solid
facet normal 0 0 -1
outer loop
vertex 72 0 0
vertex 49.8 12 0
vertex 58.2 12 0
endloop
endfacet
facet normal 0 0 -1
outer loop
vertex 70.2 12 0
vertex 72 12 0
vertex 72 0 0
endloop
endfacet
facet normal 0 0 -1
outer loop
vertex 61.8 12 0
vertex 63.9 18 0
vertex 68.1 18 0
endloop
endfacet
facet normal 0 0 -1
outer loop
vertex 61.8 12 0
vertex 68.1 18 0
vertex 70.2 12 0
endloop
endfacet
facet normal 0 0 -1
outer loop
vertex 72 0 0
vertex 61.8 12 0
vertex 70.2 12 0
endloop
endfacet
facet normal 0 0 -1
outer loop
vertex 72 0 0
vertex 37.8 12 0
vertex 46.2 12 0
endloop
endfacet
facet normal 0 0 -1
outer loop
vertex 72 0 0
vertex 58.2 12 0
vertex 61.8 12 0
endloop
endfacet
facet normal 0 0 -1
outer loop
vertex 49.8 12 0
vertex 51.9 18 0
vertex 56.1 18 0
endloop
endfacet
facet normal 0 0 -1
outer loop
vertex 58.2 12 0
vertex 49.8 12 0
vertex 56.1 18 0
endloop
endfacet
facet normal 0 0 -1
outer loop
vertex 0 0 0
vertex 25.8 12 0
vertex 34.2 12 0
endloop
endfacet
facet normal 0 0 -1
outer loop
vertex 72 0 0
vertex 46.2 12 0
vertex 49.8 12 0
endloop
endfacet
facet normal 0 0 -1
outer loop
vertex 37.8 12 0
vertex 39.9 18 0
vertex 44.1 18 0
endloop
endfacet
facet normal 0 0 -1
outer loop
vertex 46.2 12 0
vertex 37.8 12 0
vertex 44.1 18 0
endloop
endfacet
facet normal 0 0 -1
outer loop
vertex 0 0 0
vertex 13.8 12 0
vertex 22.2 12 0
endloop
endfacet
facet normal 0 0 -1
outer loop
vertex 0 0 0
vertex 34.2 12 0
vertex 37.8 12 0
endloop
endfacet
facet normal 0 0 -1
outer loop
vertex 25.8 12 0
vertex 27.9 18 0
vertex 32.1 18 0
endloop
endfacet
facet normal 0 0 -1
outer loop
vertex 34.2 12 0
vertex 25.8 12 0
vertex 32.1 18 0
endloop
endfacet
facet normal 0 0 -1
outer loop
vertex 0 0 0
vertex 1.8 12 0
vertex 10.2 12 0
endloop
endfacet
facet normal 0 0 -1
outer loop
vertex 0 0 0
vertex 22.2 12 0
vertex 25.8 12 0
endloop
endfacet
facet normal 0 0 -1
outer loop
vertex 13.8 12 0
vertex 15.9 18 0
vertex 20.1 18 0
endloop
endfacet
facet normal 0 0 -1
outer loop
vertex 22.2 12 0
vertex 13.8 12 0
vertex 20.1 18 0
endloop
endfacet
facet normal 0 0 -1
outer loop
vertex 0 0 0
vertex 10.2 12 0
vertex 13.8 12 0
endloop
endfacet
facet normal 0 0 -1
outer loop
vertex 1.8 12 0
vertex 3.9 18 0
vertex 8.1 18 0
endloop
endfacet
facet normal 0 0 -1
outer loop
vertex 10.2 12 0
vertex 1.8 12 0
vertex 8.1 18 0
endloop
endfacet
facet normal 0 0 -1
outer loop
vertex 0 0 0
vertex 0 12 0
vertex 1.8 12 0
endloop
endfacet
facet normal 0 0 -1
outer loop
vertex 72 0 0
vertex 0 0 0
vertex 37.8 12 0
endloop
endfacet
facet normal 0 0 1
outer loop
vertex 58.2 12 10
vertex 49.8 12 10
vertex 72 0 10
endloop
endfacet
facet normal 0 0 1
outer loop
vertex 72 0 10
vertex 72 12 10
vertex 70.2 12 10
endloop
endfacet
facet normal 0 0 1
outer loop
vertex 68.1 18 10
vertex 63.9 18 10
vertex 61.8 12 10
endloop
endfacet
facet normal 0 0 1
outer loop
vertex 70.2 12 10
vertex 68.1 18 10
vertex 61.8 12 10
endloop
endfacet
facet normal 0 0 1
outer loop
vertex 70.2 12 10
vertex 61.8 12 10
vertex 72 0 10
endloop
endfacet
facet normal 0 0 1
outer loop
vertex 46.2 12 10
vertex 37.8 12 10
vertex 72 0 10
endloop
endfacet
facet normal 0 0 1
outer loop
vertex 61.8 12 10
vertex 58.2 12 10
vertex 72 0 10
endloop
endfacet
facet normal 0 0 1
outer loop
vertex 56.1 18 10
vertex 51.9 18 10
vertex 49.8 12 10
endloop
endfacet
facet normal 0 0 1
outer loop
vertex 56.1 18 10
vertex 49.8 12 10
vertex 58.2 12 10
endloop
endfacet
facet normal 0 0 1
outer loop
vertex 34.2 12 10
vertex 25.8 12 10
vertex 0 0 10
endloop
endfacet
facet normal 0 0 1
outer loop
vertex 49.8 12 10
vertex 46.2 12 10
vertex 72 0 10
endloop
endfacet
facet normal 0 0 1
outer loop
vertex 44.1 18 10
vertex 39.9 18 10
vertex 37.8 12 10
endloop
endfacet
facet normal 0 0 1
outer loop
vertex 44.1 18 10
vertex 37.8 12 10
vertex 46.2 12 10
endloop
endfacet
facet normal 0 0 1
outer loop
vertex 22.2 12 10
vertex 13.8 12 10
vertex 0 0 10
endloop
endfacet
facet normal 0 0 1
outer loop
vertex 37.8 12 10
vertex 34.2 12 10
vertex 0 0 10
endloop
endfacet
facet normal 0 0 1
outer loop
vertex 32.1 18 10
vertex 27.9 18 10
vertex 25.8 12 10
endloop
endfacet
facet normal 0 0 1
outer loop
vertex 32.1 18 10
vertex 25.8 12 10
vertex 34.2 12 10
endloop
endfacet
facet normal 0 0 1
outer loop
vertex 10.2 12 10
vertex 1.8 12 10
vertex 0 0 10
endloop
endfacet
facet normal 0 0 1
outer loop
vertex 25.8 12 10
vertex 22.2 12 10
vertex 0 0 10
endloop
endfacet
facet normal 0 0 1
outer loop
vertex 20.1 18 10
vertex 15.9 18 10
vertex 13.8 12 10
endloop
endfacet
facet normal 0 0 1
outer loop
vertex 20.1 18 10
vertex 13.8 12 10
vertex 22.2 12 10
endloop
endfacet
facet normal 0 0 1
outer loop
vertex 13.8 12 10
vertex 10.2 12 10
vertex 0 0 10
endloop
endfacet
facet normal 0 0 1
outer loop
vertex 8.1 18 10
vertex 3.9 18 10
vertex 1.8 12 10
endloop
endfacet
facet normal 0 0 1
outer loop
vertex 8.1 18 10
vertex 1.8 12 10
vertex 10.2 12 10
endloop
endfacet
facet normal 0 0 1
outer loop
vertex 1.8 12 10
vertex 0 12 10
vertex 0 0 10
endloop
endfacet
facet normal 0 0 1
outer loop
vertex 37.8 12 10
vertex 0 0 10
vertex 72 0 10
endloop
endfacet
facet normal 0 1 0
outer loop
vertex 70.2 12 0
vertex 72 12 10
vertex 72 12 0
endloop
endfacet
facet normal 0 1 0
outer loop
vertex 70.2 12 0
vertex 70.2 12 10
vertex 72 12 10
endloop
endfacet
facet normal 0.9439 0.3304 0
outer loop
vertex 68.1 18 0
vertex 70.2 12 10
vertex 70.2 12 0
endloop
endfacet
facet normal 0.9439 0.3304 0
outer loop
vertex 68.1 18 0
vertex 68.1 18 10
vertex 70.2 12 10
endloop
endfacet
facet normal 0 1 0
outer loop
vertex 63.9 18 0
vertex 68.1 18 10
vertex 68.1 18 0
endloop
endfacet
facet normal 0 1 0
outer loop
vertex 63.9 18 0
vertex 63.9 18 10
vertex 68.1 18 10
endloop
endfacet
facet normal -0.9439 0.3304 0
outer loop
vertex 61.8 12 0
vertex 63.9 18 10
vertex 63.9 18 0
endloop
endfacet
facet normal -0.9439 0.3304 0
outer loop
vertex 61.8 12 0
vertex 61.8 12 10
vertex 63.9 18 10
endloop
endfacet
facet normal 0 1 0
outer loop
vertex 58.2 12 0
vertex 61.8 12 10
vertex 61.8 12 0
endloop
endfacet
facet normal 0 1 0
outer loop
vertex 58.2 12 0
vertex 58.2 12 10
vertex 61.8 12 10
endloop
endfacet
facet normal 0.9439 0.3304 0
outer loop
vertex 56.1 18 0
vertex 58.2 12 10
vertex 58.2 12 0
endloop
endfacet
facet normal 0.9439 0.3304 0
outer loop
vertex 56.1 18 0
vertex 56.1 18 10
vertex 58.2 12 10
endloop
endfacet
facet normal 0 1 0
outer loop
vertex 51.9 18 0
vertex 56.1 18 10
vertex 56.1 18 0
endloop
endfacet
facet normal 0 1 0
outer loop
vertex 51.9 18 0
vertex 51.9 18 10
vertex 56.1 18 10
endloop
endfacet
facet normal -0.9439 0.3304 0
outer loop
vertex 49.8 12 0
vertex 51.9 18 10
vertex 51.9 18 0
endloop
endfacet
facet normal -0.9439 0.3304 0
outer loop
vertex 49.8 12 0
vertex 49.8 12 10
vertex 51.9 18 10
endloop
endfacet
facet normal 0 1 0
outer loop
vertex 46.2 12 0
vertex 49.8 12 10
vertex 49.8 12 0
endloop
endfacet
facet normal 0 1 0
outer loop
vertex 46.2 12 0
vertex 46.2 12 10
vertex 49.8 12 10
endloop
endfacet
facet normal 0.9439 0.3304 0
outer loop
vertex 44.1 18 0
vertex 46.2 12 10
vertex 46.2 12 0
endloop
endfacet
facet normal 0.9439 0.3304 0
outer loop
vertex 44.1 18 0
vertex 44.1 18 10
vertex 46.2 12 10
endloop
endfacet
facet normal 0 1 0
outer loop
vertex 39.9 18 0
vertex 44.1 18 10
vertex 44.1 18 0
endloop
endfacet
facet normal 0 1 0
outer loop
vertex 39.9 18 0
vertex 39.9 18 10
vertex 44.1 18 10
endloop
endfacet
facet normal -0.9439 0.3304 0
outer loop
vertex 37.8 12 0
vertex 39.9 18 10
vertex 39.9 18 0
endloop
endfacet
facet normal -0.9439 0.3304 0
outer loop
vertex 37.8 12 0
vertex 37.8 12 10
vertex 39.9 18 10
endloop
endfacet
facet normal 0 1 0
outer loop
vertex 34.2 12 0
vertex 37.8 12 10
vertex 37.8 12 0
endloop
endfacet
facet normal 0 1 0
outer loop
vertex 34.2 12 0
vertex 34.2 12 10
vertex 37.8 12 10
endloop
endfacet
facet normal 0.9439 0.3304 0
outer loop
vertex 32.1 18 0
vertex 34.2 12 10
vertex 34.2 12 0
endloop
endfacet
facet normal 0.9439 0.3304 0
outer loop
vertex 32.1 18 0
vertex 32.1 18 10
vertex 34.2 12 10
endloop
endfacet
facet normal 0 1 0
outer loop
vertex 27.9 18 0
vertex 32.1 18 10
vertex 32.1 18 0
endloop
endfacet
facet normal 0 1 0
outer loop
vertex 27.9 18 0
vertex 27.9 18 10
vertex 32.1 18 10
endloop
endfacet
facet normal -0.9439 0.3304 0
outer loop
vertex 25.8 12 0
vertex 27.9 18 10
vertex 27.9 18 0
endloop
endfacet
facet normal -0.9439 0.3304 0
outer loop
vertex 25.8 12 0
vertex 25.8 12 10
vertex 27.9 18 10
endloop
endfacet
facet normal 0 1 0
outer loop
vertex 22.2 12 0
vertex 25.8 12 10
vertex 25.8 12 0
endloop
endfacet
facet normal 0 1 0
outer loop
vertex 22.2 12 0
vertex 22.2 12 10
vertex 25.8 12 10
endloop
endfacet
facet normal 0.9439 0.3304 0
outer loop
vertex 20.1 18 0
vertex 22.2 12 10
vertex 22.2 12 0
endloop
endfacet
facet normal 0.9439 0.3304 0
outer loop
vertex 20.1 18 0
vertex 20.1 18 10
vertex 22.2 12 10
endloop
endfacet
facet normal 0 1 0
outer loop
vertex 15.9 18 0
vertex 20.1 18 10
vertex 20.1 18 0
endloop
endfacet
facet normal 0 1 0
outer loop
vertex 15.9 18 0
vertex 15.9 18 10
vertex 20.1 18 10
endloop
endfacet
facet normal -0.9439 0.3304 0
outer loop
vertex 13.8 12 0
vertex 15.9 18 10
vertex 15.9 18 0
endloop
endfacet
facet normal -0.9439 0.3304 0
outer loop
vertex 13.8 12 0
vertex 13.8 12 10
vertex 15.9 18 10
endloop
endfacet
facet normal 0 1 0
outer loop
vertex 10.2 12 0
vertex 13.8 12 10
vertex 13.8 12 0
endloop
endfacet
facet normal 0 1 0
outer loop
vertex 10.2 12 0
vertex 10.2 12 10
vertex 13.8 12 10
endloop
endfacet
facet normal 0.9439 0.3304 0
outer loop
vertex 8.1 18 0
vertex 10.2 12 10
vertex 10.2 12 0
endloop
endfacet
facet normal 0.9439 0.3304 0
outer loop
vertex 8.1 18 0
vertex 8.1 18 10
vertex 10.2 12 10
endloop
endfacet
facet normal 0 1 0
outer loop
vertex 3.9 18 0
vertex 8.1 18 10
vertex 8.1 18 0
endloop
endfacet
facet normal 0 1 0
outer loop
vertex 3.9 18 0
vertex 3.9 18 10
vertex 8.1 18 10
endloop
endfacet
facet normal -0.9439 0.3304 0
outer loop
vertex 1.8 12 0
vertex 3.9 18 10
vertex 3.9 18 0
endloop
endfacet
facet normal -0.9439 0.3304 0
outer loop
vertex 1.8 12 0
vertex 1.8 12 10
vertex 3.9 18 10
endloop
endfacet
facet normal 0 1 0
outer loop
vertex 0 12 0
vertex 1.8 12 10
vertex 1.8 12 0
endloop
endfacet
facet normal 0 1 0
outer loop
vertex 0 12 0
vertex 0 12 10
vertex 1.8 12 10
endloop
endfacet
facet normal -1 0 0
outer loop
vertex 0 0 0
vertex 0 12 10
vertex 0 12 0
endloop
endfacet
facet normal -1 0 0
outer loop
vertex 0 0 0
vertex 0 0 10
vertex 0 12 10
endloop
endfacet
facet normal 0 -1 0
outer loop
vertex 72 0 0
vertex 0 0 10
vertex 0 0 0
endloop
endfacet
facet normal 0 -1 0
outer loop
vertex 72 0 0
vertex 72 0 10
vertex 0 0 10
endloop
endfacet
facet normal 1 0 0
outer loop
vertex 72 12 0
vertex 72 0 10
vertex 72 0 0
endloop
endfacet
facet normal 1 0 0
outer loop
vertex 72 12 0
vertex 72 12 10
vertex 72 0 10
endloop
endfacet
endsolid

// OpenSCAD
$fn = 32;

// ----------------------------------------------------------------------
// Gear rack: 6 teeth, pitch 12 mm
// ----------------------------------------------------------------------

// --- parameters (mm) ---
teeth = 6;                // number of teeth
pitch = 12;               // tooth pitch, X
root_w = 8.4;             // tooth width at the root
tip_w = 4.2;              // tooth width at the tip
base_h = 12;              // rack body height, Y
tooth_h = 6;              // tooth height above the body
plate_t = 10;             // rack width, Z (extrusion height)

rack_l = teeth * pitch;  // overall length
total_h = base_h + tooth_h;  // overall height

profile = [[0, 0], [72, 0], [72, 12], [70.2, 12], [68.1, 18], [63.9, 18], [61.8, 12], [58.2, 12], [56.1, 18], [51.9, 18], [49.8, 12], [46.2, 12], [44.1, 18], [39.9, 18], [37.8, 12], [34.2, 12], [32.1, 18], [27.9, 18], [25.8, 12], [22.2, 12], [20.1, 18], [15.9, 18], [13.8, 12], [10.2, 12], [8.1, 18], [3.9, 18], [1.8, 12], [0, 12]];  // primary outline, 28 points, counter clockwise

// --- the one profile operation ---
linear_extrude(height = plate_t) polygon(points = profile);
